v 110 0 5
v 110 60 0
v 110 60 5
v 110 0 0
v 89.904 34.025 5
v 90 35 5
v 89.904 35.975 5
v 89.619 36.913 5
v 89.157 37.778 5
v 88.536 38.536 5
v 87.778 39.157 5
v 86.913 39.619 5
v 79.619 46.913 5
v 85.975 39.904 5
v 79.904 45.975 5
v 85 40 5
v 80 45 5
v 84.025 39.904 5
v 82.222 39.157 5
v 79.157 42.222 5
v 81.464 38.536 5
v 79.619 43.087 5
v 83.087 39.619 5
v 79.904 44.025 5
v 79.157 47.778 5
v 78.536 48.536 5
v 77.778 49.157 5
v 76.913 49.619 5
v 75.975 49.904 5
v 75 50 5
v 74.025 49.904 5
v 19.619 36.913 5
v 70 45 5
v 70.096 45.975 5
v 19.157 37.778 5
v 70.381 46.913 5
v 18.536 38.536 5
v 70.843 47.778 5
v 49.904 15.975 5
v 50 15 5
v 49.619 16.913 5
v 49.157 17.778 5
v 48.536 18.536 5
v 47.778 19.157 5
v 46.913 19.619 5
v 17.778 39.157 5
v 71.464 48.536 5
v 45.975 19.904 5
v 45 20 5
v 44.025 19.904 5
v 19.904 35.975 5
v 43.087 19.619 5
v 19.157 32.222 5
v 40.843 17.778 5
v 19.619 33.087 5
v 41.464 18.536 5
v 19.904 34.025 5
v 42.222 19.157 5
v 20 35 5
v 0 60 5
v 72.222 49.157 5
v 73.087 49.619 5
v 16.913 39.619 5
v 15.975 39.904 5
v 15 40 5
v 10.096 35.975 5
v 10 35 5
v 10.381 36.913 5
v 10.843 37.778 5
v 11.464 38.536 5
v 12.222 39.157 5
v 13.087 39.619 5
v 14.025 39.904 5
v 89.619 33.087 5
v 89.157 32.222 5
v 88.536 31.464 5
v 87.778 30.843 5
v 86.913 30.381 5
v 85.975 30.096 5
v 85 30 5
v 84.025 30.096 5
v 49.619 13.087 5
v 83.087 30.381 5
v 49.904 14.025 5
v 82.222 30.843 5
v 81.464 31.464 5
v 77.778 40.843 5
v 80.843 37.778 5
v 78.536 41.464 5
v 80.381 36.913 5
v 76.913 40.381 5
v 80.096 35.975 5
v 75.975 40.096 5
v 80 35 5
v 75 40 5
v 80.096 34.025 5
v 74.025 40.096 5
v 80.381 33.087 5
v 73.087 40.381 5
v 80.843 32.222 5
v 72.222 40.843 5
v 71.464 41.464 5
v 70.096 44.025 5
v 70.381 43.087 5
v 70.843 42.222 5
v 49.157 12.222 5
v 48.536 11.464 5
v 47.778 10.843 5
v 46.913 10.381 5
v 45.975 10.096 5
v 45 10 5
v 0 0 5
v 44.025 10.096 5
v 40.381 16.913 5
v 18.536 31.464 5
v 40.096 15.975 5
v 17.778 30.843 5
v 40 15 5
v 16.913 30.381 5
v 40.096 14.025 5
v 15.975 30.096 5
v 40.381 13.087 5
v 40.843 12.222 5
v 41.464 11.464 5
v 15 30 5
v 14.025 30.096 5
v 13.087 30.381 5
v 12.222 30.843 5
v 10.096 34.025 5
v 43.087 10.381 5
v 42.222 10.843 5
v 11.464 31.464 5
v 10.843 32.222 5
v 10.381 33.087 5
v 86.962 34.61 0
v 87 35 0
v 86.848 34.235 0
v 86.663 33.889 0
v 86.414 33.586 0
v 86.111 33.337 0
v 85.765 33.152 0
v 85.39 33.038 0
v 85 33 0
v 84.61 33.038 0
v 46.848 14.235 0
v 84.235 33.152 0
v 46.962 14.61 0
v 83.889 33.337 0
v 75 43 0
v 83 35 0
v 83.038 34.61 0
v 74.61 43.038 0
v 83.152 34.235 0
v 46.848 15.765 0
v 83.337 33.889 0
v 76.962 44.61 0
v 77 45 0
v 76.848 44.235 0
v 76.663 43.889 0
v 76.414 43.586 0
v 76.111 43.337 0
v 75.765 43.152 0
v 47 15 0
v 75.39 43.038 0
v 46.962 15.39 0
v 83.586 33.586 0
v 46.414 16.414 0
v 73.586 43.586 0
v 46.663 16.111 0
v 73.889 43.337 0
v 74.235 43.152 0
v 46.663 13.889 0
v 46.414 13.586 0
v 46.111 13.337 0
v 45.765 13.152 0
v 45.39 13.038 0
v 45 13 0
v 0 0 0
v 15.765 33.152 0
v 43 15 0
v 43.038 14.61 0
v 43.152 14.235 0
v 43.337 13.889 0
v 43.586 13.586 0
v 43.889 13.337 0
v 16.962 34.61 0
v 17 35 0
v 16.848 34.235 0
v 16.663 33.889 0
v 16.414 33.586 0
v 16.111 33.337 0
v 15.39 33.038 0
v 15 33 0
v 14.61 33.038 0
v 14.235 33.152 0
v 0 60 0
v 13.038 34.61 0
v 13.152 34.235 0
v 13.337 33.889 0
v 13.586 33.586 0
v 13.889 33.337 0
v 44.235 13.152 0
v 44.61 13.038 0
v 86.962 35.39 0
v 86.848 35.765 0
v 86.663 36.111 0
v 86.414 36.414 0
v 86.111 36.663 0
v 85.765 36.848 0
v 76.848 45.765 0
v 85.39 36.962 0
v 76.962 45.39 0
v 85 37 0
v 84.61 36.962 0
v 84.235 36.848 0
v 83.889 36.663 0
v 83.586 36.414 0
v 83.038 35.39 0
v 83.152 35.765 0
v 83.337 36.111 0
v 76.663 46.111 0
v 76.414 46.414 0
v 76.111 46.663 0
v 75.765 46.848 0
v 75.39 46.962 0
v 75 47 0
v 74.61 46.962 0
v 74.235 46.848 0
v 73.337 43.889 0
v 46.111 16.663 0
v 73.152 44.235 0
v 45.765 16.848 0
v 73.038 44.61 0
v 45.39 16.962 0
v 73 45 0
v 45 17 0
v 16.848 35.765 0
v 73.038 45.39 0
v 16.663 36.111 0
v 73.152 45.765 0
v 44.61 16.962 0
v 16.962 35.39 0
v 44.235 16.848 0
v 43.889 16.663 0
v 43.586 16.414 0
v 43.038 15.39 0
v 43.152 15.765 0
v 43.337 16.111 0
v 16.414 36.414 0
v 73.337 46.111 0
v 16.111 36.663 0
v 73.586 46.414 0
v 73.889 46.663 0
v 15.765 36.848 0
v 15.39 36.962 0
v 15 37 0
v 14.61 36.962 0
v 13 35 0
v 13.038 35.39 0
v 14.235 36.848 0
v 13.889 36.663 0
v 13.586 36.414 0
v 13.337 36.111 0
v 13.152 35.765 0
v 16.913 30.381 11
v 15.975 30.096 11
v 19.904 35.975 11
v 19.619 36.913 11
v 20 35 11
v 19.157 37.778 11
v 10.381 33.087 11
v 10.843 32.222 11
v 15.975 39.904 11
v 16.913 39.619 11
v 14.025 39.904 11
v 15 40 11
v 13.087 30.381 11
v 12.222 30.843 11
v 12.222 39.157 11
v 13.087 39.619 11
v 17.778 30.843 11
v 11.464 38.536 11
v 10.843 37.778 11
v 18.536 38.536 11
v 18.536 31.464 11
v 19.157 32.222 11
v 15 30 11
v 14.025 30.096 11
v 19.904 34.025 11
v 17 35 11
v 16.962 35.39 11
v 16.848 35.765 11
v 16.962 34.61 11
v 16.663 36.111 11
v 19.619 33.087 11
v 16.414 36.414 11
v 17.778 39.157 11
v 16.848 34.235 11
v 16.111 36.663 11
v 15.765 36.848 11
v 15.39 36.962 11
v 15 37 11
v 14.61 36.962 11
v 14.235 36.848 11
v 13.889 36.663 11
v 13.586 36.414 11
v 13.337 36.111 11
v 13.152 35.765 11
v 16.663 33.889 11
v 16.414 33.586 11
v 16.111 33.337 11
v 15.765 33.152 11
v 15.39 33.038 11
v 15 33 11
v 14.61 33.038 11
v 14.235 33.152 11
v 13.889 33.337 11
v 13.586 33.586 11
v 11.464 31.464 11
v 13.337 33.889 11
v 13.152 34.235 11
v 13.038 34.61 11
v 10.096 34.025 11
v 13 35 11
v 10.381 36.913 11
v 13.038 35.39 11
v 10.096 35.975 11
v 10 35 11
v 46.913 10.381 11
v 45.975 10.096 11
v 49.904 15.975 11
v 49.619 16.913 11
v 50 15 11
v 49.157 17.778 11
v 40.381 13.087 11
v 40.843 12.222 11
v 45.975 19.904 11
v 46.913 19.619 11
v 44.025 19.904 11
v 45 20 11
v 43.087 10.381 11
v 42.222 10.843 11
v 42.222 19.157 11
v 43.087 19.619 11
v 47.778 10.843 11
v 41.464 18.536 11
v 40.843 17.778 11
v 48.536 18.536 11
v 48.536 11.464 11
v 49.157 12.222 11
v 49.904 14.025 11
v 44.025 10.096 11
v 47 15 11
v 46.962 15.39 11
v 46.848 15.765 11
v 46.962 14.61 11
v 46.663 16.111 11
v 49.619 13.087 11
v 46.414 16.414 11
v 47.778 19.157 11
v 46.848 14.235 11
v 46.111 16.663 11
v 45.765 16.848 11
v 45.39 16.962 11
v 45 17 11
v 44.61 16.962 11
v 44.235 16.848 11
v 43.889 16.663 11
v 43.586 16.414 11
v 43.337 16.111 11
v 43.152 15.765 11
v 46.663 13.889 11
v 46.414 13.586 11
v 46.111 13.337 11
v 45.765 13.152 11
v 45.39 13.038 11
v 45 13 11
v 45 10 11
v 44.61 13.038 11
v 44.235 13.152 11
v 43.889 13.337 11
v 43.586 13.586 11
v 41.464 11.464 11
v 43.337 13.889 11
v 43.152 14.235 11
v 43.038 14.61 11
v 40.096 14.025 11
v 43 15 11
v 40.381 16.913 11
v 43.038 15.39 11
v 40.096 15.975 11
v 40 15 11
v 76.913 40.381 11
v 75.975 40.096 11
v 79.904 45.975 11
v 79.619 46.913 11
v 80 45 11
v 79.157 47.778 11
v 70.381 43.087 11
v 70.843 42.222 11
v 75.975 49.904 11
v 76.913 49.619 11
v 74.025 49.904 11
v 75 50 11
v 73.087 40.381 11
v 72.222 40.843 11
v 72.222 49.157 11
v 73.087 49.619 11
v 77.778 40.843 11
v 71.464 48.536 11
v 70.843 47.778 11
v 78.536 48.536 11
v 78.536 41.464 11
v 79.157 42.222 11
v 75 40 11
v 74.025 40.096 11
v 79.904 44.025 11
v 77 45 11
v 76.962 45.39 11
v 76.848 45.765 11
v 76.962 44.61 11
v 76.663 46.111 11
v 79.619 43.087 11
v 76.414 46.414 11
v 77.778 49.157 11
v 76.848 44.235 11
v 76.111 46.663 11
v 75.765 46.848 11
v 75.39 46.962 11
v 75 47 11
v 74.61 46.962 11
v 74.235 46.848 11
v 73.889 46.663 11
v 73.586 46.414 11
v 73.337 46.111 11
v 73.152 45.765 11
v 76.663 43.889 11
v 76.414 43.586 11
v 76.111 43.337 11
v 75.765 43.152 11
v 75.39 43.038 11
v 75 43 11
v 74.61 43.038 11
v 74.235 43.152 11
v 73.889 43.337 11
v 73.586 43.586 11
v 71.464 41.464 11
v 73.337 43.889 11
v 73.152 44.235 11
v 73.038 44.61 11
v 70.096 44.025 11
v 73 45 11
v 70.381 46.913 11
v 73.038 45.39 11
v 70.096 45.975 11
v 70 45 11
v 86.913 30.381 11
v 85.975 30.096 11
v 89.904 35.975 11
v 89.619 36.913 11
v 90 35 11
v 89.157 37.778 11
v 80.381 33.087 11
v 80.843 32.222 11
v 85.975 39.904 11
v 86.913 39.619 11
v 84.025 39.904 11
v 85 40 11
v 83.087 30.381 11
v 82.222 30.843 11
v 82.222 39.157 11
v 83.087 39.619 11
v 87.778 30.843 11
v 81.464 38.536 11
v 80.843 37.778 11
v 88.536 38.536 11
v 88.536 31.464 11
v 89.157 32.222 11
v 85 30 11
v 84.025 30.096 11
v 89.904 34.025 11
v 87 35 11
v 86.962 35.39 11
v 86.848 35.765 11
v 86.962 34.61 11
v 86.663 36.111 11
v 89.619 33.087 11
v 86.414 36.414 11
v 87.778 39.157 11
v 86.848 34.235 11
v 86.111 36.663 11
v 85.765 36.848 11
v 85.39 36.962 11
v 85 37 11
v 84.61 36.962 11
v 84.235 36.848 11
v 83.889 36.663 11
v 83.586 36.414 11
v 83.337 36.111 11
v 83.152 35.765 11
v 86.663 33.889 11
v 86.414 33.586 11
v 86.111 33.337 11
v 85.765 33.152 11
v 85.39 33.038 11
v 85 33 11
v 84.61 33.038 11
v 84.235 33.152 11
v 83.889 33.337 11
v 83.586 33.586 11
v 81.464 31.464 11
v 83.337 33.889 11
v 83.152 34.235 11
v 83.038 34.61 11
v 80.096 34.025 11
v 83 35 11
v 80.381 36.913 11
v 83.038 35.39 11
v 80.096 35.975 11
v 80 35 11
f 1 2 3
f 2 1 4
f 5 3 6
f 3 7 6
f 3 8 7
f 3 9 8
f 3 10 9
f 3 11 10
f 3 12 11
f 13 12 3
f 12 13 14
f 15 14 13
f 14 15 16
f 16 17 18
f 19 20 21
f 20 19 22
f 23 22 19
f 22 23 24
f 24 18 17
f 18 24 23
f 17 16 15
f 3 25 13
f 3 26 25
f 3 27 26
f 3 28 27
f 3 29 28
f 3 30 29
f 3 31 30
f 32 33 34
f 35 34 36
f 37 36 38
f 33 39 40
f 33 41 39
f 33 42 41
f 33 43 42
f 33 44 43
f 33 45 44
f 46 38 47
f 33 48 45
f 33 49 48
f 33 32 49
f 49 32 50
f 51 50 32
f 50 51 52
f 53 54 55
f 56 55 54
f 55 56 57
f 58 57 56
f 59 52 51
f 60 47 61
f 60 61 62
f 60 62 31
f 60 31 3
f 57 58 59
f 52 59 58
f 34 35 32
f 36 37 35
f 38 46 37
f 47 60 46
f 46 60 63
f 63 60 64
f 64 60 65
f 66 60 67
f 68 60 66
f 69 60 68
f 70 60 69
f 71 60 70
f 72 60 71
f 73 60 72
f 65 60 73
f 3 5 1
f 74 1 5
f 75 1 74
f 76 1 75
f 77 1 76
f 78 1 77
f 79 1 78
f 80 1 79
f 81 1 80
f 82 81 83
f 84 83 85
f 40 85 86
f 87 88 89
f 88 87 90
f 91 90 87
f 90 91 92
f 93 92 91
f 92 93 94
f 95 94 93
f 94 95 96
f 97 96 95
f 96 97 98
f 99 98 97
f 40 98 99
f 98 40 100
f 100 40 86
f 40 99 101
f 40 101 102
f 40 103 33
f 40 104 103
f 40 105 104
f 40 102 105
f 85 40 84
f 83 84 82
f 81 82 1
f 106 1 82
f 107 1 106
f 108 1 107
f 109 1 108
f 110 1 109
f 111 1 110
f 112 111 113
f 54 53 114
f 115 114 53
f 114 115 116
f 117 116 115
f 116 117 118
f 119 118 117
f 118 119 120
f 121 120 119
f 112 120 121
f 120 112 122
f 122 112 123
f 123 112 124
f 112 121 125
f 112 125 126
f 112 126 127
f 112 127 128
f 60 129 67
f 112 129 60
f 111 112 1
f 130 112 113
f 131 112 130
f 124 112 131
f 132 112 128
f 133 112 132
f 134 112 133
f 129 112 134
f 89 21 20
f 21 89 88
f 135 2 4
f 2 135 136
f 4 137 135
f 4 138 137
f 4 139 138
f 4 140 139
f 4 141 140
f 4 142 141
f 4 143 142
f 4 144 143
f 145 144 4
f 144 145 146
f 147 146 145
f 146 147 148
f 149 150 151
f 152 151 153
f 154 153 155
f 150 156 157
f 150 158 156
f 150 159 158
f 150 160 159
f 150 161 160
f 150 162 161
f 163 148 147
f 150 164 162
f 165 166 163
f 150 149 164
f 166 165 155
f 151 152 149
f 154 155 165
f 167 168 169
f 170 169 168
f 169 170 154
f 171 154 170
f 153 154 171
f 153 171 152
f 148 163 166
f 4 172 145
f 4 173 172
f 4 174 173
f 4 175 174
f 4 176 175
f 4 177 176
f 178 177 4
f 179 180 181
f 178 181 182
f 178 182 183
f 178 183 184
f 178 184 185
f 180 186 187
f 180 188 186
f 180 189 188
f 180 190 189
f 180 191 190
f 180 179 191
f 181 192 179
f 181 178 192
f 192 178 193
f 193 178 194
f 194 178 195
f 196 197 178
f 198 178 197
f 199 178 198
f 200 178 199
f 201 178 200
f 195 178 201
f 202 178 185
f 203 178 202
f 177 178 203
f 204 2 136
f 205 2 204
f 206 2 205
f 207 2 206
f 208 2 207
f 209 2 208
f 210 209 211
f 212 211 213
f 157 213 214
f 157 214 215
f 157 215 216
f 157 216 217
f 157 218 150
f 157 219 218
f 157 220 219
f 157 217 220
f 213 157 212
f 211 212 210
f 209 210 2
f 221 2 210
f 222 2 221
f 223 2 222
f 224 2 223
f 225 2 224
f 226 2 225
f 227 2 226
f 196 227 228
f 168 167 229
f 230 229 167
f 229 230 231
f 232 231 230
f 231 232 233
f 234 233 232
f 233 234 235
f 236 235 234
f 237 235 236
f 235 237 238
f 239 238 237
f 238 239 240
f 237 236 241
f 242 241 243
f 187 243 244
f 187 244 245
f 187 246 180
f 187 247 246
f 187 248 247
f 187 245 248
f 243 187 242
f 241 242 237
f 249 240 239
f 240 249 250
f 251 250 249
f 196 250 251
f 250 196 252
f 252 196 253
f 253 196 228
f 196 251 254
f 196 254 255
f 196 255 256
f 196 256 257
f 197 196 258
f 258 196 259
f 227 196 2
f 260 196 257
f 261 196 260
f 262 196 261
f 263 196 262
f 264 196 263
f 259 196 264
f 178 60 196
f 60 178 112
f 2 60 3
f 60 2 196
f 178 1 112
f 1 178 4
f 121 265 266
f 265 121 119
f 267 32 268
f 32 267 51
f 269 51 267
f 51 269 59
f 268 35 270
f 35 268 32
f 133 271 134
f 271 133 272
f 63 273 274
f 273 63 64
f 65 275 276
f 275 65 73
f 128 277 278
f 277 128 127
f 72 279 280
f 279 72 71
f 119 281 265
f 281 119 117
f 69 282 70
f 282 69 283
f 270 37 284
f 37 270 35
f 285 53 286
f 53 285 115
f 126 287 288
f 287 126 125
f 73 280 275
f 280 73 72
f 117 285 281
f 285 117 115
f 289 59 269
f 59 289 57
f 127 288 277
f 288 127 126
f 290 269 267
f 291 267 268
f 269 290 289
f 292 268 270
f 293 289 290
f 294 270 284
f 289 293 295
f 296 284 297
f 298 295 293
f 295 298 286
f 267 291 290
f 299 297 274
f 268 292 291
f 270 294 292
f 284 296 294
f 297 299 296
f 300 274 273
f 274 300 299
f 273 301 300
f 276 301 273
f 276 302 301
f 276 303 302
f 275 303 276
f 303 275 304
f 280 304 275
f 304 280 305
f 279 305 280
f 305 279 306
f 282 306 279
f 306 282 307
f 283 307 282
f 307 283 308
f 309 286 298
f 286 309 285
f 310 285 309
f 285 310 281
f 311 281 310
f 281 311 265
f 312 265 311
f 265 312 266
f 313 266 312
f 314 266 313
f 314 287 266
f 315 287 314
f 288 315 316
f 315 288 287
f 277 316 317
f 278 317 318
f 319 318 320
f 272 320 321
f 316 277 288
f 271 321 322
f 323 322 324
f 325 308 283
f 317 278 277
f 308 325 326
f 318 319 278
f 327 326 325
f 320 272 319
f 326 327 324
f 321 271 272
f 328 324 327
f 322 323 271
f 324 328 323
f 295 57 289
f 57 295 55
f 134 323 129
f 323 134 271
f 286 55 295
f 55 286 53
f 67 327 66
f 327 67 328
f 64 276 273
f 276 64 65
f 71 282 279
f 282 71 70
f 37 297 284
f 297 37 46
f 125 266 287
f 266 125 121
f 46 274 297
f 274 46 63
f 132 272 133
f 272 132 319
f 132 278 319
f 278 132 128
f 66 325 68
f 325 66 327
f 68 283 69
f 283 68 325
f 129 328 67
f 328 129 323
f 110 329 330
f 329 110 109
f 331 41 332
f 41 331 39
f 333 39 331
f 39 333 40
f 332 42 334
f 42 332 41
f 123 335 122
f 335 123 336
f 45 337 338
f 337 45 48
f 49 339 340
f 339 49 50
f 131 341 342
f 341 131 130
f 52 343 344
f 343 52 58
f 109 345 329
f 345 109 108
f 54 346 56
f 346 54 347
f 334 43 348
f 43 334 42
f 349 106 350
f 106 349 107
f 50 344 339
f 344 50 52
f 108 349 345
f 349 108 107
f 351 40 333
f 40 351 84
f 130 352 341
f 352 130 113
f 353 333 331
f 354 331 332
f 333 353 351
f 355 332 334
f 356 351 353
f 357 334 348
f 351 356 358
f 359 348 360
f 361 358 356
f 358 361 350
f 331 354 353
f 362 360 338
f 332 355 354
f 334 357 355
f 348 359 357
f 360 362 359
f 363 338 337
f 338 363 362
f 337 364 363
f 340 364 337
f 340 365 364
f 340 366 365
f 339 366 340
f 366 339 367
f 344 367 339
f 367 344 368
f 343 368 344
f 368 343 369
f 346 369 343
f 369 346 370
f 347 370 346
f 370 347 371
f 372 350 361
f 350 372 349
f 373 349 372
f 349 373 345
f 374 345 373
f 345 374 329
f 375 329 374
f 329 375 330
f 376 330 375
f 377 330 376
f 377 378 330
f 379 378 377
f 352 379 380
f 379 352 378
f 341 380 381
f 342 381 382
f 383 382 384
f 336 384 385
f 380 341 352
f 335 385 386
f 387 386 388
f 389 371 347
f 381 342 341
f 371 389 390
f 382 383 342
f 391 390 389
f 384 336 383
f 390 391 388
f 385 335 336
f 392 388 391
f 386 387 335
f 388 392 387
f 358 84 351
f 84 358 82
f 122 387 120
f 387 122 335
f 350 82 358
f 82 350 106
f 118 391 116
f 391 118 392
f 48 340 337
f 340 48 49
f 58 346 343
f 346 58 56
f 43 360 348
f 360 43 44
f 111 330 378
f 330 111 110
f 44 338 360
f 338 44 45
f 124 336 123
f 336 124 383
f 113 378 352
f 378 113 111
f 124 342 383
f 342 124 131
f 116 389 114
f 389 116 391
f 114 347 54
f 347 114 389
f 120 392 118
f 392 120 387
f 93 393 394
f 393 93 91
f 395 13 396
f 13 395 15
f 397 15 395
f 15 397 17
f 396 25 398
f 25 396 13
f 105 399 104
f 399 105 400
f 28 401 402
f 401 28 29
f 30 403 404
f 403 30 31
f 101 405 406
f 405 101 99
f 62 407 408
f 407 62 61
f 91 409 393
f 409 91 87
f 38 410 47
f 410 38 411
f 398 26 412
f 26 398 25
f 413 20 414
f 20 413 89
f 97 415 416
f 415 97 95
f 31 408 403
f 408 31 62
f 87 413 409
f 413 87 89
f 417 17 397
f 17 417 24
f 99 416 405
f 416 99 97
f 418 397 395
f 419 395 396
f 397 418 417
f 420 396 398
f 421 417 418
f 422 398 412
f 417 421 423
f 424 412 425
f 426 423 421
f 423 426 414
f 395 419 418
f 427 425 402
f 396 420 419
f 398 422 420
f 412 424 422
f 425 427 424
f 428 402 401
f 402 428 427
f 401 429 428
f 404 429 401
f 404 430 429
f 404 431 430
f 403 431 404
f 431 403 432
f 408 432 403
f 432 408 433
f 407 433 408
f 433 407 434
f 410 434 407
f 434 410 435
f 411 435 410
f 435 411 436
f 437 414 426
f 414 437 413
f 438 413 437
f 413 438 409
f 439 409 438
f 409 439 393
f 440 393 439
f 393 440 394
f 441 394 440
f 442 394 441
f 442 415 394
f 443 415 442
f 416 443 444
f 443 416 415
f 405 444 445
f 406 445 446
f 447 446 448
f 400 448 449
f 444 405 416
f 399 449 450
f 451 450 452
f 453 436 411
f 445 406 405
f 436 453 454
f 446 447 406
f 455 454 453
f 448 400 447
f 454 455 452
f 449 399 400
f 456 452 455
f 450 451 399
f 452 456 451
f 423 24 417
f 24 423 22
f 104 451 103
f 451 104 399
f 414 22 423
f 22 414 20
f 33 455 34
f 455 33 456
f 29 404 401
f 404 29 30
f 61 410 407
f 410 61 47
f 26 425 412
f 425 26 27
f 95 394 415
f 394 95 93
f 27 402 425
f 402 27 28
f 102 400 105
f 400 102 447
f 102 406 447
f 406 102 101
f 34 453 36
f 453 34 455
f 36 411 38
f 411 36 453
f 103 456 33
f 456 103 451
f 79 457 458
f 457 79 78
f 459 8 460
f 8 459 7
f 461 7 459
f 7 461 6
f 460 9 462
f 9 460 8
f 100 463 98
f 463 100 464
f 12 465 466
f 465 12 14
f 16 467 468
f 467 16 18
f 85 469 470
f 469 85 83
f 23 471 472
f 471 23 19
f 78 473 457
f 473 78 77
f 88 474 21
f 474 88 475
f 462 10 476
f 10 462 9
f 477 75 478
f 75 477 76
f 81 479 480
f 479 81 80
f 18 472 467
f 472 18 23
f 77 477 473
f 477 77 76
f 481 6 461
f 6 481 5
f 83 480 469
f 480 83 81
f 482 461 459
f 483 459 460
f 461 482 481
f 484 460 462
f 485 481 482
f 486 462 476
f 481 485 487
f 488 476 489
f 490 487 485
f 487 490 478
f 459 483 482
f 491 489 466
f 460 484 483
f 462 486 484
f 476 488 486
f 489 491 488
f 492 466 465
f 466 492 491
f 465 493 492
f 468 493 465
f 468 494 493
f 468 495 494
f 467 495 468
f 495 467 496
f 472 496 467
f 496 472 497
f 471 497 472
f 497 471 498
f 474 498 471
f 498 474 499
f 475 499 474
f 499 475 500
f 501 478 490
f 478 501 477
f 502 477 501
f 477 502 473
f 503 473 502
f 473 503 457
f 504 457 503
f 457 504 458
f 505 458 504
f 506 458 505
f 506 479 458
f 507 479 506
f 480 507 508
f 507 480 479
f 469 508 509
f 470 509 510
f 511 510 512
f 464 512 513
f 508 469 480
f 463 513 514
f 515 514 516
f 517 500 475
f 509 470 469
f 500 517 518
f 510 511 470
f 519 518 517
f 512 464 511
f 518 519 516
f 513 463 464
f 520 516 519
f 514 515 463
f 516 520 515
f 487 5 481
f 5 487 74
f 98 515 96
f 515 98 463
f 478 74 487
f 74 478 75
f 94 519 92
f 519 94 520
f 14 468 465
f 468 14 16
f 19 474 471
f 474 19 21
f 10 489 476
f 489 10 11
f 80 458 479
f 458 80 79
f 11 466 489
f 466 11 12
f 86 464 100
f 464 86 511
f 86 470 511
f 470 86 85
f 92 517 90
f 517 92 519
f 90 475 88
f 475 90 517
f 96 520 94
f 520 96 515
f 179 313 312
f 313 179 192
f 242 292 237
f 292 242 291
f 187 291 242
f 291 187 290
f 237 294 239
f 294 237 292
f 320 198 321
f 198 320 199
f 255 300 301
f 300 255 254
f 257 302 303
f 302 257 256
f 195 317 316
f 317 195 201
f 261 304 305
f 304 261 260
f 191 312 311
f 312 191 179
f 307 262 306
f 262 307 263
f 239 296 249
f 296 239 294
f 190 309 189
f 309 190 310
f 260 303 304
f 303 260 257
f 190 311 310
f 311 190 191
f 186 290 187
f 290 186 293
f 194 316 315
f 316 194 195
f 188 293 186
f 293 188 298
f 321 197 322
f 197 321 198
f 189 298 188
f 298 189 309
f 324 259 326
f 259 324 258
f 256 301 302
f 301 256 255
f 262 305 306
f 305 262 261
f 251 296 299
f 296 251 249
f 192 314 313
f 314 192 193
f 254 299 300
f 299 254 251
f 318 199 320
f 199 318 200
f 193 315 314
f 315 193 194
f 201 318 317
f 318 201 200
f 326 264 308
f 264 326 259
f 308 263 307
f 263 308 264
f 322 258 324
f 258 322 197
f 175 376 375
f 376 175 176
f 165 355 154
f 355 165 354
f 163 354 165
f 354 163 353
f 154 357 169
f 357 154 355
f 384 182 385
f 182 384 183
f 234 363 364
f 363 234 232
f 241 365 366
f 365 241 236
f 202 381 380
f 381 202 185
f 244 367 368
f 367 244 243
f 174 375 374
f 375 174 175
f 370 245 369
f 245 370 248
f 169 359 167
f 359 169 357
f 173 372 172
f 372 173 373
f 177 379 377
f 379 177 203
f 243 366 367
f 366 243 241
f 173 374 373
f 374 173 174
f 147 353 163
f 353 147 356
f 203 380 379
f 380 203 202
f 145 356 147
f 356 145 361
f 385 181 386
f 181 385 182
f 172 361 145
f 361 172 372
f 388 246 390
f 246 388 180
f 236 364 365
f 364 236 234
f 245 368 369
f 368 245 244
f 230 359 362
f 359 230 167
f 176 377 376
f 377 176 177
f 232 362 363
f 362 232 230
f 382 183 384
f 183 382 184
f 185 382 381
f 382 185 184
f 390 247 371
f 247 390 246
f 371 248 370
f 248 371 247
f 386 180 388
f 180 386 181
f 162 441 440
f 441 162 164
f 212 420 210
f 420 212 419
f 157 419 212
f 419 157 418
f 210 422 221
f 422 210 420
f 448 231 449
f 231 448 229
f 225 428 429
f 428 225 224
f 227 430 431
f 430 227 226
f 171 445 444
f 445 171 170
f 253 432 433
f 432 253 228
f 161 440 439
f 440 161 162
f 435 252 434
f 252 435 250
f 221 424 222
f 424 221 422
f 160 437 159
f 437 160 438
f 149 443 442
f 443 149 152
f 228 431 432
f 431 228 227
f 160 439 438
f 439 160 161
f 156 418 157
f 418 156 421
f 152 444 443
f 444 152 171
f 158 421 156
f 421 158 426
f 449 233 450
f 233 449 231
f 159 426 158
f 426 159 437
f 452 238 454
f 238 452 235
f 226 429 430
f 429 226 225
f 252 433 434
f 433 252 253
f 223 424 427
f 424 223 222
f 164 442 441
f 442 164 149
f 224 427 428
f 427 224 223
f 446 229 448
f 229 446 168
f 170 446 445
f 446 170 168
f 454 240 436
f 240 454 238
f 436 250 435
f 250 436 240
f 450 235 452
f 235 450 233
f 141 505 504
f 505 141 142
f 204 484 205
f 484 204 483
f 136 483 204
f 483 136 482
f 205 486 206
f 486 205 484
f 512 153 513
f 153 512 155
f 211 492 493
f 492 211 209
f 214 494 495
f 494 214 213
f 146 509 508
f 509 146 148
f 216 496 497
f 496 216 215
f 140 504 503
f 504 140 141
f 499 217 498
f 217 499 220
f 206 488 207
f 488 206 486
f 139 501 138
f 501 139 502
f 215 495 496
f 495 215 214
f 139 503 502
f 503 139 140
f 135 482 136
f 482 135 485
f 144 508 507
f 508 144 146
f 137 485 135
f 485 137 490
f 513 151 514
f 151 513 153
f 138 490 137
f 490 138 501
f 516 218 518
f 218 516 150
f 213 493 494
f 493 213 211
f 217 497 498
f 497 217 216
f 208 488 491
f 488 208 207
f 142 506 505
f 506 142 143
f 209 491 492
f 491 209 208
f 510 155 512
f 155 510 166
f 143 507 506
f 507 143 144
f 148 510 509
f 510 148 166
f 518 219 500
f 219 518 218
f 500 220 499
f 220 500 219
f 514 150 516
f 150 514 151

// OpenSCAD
$fn = 32;

// ----------------------------------------------------------------------
// Boss field: plate with bosses at given coordinates
// ----------------------------------------------------------------------

// --- parameters (mm) ---
plate_l = 110;            // plate length, X
plate_w = 60;             // plate width, Y
plate_t = 5;              // plate thickness, Z
boss_d = 10;              // boss diameter
boss_h = 6;               // boss height above the plate
bore_d = 4;               // boss bore

total_h = plate_t + boss_h;  // overall height

difference() {
  union() {
    cube([plate_l, plate_w, plate_t]);
    translate([15, 35, plate_t]) cylinder(h = boss_h, d = boss_d);
    translate([45, 15, plate_t]) cylinder(h = boss_h, d = boss_d);
    translate([75, 45, plate_t]) cylinder(h = boss_h, d = boss_d);
    translate([85, 35, plate_t]) cylinder(h = boss_h, d = boss_d);
  }
  translate([15, 35, -1]) cylinder(h = total_h + 2, d = bore_d);
  translate([45, 15, -1]) cylinder(h = total_h + 2, d = bore_d);
  translate([75, 45, -1]) cylinder(h = total_h + 2, d = bore_d);
  translate([85, 35, -1]) cylinder(h = total_h + 2, d = bore_d);
}
